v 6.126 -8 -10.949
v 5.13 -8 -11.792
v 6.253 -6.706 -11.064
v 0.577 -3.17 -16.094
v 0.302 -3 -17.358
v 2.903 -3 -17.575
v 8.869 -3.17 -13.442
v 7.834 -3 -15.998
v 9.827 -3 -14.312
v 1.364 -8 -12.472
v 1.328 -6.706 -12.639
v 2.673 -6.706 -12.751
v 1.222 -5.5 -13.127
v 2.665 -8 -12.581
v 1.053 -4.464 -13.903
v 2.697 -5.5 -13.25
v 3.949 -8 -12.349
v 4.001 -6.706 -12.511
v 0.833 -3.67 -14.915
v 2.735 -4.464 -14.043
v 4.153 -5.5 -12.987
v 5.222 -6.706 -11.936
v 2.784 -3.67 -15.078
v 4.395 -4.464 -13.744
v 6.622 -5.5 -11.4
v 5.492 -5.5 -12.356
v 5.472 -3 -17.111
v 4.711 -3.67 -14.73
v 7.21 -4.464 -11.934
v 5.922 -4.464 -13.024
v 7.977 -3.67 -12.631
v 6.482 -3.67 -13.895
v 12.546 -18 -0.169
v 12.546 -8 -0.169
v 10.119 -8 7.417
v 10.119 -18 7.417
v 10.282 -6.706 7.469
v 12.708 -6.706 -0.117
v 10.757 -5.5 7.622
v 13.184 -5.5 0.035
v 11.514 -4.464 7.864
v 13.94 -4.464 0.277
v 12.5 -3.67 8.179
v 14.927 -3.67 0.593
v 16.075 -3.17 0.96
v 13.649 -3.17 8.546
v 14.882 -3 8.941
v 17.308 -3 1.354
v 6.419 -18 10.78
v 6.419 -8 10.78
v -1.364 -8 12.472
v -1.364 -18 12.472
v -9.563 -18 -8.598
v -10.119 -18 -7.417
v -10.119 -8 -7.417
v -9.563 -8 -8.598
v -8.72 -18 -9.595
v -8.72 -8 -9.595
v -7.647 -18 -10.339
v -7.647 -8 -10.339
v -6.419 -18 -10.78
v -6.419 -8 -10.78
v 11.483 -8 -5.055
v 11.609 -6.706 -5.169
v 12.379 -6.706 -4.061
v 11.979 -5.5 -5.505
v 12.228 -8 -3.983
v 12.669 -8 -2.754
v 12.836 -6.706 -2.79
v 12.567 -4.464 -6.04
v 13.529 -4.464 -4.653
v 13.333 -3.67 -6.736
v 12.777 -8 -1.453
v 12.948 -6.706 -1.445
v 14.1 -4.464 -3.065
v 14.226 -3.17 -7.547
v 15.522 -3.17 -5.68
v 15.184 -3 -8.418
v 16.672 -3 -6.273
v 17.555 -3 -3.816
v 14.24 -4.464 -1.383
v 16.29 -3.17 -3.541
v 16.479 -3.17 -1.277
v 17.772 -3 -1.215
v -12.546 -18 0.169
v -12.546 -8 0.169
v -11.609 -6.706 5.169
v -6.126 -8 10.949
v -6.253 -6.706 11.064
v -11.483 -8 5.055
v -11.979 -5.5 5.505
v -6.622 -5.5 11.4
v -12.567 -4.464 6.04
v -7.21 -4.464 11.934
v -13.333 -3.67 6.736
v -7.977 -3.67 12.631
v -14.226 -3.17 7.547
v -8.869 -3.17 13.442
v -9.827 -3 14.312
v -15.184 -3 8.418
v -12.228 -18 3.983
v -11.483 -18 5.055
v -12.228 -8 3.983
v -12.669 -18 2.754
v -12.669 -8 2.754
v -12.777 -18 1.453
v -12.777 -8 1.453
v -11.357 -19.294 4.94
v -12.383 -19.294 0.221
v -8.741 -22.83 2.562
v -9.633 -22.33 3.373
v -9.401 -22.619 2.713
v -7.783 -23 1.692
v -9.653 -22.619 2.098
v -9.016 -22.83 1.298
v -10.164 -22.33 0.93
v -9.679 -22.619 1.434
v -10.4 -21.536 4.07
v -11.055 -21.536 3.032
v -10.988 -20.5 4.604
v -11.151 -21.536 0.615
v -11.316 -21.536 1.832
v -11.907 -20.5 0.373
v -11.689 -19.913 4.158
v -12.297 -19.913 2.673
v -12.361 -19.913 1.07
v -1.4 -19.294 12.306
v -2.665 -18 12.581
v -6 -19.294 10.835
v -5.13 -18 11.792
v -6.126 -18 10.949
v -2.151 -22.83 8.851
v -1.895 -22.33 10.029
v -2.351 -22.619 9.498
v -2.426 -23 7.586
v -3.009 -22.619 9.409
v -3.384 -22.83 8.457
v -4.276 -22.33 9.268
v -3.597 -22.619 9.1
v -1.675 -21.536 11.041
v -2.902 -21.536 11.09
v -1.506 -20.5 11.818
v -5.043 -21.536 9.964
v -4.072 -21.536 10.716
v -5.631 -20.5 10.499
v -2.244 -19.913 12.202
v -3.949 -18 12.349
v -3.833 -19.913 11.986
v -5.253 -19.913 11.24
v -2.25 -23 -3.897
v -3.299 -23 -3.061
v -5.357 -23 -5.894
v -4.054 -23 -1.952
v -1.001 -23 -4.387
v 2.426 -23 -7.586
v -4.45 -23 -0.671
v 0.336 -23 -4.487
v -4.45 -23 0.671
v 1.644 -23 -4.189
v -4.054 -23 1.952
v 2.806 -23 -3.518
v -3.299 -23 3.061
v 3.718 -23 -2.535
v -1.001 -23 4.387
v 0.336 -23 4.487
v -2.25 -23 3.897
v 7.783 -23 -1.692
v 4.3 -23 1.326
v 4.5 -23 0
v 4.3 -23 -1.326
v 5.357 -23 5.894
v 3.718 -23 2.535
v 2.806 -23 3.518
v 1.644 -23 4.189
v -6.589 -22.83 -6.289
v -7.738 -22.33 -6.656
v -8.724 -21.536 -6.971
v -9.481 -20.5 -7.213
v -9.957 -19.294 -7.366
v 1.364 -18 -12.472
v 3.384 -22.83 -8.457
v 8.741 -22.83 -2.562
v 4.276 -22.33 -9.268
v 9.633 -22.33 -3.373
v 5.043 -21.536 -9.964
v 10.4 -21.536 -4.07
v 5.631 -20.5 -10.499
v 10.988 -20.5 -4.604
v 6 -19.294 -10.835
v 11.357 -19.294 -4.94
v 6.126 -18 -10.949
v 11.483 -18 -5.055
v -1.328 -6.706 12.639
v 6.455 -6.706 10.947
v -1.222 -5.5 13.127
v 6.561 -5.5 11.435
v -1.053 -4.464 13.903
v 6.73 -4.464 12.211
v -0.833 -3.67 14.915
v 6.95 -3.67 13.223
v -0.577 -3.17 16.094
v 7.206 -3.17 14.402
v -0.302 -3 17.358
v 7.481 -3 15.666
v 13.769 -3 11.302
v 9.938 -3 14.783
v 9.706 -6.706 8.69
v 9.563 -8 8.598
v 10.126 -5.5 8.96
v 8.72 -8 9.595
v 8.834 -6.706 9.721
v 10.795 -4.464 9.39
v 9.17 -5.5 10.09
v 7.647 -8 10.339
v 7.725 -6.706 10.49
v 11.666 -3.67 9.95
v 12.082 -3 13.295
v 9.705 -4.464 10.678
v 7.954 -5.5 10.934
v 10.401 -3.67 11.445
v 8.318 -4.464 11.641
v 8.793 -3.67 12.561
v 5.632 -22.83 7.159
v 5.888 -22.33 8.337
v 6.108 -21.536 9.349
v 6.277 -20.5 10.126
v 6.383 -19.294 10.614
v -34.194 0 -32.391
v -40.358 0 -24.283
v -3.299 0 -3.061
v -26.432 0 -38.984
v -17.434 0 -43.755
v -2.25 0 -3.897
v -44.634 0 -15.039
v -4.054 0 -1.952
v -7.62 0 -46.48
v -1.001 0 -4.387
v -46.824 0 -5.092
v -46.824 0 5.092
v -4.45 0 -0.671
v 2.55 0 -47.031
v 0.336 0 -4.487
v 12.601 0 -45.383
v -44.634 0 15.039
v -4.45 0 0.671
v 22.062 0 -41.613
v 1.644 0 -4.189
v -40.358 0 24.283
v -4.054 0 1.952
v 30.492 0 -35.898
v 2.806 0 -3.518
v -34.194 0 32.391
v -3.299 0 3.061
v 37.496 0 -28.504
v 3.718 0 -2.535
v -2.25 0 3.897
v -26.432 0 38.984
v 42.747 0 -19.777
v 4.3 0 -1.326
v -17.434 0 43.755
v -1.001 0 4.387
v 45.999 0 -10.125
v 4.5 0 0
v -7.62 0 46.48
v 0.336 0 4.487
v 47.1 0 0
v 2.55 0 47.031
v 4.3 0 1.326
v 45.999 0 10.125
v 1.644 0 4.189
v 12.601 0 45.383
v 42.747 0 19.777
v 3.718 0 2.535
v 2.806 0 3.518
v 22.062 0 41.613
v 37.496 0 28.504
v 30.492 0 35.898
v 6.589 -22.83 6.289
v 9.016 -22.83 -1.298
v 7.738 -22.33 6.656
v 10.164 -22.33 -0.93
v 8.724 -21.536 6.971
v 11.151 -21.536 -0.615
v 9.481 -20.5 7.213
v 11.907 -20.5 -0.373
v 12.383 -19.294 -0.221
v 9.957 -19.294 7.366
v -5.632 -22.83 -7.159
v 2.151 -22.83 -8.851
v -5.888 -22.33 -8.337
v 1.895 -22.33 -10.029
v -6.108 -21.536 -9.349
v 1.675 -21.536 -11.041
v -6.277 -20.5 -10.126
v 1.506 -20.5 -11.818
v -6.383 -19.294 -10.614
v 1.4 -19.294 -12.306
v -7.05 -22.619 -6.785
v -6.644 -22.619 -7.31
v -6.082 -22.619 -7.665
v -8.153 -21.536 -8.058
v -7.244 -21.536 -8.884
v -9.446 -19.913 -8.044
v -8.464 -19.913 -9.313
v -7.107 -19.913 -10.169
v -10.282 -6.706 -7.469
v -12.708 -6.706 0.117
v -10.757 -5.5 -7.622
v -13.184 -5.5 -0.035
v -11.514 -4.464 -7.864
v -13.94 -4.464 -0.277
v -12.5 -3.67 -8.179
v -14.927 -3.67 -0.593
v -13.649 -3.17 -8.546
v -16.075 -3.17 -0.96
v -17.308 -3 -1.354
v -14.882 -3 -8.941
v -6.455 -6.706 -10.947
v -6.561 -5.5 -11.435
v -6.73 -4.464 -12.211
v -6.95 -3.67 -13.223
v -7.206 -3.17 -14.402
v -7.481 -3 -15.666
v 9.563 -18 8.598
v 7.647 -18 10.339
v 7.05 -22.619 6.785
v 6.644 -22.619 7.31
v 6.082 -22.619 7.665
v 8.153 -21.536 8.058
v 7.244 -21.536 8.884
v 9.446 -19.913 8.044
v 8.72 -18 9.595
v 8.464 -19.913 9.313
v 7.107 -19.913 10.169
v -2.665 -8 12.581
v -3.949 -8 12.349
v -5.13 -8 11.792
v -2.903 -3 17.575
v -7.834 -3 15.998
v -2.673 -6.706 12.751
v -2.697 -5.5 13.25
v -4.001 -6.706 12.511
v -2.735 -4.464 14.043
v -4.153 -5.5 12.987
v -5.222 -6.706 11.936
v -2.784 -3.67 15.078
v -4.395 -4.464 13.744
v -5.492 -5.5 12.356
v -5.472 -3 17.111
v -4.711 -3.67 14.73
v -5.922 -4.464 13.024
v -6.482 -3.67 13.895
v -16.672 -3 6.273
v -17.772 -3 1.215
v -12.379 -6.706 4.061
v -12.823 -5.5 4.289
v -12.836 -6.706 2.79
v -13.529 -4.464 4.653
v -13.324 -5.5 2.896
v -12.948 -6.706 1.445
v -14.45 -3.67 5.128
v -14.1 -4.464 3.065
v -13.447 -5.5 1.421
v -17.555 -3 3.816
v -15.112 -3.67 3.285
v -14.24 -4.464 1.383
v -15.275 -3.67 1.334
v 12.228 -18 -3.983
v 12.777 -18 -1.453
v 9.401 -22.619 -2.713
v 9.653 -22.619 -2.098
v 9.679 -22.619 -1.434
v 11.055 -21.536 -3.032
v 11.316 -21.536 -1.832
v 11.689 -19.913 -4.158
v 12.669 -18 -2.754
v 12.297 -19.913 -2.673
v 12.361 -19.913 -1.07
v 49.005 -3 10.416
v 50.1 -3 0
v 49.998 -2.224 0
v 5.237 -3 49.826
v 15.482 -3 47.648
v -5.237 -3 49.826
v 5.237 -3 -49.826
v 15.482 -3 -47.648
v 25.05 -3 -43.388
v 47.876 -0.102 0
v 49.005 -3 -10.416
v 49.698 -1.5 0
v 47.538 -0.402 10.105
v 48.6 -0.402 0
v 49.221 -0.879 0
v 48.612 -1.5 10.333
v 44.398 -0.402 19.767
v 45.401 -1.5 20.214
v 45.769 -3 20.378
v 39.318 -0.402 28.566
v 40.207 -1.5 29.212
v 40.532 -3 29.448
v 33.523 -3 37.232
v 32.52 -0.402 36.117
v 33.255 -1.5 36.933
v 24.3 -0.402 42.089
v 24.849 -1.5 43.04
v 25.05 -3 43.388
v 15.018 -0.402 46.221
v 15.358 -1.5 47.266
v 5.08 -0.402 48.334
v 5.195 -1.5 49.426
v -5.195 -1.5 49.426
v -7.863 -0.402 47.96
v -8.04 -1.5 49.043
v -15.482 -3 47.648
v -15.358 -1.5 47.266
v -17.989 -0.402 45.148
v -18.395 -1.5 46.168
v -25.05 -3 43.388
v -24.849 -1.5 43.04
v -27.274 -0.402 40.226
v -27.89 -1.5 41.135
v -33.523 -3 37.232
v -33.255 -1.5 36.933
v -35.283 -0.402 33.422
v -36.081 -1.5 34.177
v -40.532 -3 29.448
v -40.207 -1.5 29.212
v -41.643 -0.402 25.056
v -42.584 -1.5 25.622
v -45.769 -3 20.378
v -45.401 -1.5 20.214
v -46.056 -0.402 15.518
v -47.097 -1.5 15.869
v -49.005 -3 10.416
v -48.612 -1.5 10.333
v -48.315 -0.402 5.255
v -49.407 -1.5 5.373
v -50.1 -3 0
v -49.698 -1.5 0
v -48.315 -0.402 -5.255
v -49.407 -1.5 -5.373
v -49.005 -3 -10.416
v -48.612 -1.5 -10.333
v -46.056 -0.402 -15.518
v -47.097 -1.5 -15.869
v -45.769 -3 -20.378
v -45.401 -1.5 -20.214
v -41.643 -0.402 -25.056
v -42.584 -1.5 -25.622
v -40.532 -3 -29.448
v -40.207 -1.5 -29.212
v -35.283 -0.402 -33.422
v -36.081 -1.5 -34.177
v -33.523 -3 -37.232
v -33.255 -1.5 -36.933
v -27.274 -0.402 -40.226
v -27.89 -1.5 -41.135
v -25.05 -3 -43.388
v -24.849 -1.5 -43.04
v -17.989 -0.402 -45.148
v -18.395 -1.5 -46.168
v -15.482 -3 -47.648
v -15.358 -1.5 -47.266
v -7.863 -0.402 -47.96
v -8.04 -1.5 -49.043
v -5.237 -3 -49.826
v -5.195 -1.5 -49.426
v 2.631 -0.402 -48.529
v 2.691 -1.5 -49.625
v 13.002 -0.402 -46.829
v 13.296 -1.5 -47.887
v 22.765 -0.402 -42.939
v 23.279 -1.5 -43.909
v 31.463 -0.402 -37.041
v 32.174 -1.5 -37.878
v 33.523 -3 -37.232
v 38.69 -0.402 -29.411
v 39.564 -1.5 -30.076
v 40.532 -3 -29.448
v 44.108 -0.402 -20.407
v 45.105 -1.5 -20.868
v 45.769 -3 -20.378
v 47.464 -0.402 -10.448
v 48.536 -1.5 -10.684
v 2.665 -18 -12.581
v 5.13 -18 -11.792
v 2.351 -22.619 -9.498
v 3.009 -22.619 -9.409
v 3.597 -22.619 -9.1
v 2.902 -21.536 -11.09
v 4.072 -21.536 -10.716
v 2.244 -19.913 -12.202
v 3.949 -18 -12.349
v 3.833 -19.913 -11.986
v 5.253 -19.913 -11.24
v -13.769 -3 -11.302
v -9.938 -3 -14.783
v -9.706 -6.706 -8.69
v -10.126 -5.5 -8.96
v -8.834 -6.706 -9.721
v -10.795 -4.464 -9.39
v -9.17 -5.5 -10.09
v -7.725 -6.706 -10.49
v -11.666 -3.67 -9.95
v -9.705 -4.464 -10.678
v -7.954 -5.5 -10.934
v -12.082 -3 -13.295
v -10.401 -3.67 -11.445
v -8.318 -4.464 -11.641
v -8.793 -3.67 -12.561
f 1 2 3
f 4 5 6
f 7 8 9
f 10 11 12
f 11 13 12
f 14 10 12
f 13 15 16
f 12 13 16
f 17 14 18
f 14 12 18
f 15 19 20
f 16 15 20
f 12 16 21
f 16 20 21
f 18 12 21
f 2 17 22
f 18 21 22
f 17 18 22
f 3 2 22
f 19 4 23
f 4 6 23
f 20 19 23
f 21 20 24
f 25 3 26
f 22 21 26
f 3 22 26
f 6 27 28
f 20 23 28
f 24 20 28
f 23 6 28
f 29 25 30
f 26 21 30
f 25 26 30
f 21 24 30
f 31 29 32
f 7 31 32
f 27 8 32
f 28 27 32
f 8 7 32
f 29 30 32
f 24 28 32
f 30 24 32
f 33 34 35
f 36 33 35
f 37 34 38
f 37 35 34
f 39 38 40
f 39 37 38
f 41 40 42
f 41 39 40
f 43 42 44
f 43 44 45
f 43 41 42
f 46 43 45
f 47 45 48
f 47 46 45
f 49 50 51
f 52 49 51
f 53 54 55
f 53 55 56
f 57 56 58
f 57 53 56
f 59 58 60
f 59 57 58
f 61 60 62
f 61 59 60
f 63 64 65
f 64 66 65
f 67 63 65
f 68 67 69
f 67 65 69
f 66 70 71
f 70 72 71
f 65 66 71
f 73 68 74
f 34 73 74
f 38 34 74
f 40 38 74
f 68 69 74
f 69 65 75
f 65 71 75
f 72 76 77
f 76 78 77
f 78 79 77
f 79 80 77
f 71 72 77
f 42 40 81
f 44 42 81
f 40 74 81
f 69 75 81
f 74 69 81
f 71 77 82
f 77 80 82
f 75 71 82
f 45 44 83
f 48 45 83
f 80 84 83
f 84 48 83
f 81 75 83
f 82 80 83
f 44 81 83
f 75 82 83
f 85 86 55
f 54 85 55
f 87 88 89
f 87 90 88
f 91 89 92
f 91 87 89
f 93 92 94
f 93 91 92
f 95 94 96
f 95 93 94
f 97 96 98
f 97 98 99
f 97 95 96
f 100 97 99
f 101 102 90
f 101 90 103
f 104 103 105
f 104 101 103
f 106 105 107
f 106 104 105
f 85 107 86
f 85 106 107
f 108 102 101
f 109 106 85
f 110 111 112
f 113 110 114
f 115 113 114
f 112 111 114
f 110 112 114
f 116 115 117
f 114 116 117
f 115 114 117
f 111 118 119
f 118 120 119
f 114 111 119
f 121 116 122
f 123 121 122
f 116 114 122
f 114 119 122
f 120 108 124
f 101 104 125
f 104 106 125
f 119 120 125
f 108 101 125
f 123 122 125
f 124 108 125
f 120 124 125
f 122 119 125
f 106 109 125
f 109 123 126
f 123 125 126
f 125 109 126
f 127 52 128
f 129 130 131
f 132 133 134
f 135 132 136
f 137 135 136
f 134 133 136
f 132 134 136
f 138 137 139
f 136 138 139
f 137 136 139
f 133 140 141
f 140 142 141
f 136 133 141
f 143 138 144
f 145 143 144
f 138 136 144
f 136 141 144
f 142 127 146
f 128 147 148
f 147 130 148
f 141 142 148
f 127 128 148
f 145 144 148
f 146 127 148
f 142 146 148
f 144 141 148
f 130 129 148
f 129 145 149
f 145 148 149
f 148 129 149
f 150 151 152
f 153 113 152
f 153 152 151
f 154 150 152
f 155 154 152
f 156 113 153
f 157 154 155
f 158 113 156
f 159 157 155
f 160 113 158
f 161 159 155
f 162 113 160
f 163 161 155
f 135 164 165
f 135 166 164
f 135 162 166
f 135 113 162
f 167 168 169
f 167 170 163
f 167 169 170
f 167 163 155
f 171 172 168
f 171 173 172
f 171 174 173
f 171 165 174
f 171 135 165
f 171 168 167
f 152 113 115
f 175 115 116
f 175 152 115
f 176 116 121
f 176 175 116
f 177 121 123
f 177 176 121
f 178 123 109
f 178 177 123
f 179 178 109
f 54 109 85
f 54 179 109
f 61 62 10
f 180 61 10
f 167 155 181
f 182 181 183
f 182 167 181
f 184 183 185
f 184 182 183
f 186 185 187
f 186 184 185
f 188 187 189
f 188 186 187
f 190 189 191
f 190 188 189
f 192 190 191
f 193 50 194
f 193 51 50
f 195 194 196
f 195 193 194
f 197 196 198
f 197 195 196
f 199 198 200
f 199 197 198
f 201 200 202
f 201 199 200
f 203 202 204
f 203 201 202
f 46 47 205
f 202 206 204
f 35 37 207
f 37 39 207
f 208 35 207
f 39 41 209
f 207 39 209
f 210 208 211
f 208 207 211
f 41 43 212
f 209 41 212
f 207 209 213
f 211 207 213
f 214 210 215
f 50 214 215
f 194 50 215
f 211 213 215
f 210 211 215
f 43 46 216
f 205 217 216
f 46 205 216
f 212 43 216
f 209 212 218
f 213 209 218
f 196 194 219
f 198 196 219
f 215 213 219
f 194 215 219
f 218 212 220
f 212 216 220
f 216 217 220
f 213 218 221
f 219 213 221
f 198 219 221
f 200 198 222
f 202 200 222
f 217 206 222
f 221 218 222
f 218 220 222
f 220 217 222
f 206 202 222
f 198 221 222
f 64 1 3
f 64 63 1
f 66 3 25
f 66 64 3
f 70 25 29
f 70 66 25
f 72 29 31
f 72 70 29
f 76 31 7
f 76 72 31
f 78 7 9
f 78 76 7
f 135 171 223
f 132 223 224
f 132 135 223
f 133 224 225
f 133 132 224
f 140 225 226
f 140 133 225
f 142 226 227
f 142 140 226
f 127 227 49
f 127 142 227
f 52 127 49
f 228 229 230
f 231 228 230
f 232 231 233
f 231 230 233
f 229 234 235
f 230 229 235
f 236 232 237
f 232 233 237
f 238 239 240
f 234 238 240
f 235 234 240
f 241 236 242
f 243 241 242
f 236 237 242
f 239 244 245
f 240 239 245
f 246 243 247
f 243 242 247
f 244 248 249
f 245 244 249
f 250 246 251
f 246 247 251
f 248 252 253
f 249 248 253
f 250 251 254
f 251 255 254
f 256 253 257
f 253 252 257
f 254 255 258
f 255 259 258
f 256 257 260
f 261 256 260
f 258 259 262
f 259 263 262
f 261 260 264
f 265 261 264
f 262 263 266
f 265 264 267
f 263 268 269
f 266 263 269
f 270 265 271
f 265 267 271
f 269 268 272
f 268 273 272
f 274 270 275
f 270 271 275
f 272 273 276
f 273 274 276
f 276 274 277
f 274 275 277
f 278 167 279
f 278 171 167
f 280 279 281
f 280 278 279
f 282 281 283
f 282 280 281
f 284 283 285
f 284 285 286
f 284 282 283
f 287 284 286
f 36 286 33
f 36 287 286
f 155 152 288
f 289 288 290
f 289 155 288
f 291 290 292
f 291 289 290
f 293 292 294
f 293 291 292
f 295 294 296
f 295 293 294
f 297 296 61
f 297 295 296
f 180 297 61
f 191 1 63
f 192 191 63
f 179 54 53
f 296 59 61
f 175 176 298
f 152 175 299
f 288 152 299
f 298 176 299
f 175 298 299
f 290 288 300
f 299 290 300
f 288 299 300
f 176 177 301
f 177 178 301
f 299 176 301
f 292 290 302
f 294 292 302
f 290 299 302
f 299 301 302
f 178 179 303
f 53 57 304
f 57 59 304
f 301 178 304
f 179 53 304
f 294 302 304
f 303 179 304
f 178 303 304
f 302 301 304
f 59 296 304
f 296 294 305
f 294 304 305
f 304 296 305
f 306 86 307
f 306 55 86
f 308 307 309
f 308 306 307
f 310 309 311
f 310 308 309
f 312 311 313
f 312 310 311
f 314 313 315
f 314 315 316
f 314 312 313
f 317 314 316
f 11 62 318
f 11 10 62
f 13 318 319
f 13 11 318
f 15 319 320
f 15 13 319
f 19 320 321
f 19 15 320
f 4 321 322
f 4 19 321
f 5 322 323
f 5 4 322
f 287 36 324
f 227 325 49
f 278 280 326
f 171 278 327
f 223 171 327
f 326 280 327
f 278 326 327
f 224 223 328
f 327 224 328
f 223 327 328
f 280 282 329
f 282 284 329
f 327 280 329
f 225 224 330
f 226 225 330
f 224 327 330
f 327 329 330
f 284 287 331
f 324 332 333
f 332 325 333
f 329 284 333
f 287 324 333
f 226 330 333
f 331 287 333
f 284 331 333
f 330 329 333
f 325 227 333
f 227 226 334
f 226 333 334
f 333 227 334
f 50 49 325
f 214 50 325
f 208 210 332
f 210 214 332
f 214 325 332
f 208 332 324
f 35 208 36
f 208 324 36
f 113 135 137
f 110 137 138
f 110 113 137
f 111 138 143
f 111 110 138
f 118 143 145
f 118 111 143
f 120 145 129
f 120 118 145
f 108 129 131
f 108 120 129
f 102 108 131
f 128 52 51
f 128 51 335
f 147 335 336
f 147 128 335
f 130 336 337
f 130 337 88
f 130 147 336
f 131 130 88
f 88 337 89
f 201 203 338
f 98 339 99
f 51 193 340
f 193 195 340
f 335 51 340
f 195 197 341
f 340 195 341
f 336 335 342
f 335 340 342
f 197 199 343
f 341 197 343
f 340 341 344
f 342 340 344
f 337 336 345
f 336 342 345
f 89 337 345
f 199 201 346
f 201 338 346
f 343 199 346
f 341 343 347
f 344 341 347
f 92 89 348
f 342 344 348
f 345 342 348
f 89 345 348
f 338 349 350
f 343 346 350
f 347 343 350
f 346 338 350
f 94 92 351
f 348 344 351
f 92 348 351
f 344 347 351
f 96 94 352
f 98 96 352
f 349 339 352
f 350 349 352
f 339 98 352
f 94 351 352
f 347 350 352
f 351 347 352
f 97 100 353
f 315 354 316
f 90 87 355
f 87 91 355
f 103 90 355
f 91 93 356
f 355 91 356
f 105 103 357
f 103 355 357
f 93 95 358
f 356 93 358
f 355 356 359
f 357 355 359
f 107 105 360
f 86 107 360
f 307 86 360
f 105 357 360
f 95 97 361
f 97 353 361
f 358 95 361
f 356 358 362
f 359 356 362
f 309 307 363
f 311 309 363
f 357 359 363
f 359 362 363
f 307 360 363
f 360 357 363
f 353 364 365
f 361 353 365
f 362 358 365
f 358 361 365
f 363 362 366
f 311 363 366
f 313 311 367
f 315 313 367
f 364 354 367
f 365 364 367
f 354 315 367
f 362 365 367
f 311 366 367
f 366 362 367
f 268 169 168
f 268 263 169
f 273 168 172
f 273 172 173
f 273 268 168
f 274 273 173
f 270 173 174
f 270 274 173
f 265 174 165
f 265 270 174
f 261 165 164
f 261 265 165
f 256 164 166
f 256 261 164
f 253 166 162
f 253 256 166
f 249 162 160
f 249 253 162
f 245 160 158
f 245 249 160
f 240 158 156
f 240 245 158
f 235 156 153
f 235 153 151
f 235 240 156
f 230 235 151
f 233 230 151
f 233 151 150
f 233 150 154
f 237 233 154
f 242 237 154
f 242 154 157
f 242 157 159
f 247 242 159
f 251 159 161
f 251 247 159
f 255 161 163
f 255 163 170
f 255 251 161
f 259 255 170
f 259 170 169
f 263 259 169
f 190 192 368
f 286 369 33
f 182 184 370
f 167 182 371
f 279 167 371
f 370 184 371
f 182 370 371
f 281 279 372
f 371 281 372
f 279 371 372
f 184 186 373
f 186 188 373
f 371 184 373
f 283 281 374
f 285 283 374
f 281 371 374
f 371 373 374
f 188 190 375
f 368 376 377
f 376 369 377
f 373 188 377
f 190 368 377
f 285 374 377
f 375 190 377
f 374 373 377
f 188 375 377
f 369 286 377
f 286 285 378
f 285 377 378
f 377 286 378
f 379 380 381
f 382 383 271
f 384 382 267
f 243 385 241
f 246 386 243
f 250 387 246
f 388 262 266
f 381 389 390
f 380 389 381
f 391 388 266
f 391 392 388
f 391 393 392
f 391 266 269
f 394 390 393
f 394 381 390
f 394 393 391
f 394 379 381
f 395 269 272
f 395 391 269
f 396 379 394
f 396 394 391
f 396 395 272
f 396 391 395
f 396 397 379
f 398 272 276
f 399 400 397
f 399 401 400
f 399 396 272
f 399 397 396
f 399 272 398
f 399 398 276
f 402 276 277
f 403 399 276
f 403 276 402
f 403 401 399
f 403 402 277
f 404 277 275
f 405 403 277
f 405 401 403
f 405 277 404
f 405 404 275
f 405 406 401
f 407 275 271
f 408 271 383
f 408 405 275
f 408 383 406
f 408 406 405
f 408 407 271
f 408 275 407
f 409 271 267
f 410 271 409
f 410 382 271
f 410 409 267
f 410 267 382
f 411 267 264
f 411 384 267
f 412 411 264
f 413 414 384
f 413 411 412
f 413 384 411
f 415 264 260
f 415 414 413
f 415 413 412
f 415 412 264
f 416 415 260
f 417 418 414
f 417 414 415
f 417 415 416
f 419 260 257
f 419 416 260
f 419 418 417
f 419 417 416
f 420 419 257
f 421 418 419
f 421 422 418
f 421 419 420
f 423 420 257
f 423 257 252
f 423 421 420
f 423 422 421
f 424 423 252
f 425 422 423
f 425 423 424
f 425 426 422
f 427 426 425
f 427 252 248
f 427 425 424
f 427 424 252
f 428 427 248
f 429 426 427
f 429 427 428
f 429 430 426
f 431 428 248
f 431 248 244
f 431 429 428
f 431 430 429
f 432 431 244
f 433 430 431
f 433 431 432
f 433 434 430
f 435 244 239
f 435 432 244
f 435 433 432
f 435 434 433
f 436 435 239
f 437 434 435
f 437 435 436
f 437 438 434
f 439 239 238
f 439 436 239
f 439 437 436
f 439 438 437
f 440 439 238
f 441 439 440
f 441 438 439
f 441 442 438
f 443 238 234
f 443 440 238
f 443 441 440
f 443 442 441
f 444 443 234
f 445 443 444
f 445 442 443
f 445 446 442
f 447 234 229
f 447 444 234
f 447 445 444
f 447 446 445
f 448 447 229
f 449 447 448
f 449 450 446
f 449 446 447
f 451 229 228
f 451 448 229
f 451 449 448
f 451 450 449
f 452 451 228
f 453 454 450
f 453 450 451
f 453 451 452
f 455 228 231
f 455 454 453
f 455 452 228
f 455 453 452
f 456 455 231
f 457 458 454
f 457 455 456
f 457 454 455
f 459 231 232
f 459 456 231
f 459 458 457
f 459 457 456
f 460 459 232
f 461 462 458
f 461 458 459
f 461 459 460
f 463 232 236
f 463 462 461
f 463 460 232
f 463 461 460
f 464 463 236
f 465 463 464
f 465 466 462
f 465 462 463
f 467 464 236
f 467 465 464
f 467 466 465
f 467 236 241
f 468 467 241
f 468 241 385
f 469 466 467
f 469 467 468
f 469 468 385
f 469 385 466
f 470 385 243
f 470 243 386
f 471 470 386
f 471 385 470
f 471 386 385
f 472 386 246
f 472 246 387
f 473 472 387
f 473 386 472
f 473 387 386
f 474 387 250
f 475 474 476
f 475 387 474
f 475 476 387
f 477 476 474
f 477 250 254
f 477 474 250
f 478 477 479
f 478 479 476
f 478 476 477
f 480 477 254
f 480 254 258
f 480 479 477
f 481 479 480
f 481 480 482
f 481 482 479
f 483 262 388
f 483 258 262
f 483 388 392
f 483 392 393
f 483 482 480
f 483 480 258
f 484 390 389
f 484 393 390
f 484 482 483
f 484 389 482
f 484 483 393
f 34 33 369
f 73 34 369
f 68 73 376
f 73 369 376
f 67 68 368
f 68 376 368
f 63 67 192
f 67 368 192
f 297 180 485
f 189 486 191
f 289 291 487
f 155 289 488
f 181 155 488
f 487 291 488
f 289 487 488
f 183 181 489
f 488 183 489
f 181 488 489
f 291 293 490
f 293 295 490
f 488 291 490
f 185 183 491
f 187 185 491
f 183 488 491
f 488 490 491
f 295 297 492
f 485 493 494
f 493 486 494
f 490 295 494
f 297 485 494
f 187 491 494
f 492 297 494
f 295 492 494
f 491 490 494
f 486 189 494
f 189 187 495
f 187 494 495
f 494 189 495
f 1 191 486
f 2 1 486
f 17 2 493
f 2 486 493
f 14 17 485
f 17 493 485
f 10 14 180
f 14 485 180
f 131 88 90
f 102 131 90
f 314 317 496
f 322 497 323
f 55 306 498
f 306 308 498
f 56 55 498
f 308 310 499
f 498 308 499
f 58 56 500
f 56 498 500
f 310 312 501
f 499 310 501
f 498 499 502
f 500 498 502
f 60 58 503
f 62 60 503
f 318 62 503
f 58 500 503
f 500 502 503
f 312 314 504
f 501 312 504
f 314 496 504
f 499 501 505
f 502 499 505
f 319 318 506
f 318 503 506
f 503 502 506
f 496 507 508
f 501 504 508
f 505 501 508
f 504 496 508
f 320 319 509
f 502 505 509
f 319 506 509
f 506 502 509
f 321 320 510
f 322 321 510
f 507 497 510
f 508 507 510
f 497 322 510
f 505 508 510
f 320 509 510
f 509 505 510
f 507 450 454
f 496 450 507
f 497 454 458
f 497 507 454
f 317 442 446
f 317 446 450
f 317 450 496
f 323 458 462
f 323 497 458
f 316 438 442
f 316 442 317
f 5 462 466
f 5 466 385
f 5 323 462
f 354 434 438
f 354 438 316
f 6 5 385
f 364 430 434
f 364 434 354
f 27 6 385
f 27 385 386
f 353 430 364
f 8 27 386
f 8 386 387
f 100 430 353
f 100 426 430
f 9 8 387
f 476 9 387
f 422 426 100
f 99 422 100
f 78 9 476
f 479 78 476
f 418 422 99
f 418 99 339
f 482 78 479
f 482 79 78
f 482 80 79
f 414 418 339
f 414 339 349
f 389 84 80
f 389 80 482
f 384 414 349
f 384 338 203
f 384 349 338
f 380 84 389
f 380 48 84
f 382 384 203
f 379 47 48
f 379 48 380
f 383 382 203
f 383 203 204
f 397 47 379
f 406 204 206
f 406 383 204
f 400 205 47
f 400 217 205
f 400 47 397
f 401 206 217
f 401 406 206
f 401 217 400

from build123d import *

# Parameters (mm, degrees)
F0_R     = 50.1
F0_R_2   = 4.5
F1_DEPTH = 3
F2_R     = 4.5
F3_DEPTH = 20
F4_R     = 2.99999
F5_R     = 5
F6_R     = 5


# Not quite as in the source:
# - a fillet or chamfer is up to 0.001 mm smaller than in the source, because OpenCascade refuses the exact size


with BuildPart() as f1:
    # F0 (on Front) → F1 (new body)
    with BuildSketch(Plane.XZ):
        Circle(F0_R)
        Circle(F0_R_2, mode=Mode.SUBTRACT)
    extrude(amount=F1_DEPTH)

    # F2 (on face) → F3 (join)
    with BuildSketch(Plane.XZ.offset(3)):
        Polygon((9.2398859849, 10.167053197), (-4.1849833578, 13.0855025895), (-13.4248693427, 2.9184493925), (-9.2398859849, -10.167053197), (4.1849833578, -13.0855025895), (13.4248693427, -2.9184493925), align=None)
        Circle(F2_R, mode=Mode.SUBTRACT)
    extrude(amount=F3_DEPTH)

    # F4 (radius 3 in the source; OpenCascade refuses exactly that, so slightly less here)
    f4_edges = [f1.edges().sort_by_distance(p)[0] for p in [
        (-50.1, 0, 0),
    ]]
    fillet(f4_edges, radius=F4_R)

    # F5
    f5_edges = [f1.edges().sort_by_distance(p)[0] for p in [
        (-4.184983, -13, 13.085503),
        (9.239886, -13, 10.167053),
        (13.424869, -13, -2.918449),
        (4.184983, -13, -13.085503),
        (-9.239886, -13, -10.167053),
        (-13.424869, -13, 2.918449),
    ]]
    fillet(f5_edges, radius=F5_R)

    # F6
    f6_edges = [f1.edges().sort_by_distance(p)[0] for p in [
        (11.332378, -3, 3.624302),
        (12.545511, -13, -0.168893),
        (10.119245, -13, 7.417497),
        (11.332378, -23, 3.624302),
    ]]
    fillet(f6_edges, radius=F6_R)


solid = f1.part
